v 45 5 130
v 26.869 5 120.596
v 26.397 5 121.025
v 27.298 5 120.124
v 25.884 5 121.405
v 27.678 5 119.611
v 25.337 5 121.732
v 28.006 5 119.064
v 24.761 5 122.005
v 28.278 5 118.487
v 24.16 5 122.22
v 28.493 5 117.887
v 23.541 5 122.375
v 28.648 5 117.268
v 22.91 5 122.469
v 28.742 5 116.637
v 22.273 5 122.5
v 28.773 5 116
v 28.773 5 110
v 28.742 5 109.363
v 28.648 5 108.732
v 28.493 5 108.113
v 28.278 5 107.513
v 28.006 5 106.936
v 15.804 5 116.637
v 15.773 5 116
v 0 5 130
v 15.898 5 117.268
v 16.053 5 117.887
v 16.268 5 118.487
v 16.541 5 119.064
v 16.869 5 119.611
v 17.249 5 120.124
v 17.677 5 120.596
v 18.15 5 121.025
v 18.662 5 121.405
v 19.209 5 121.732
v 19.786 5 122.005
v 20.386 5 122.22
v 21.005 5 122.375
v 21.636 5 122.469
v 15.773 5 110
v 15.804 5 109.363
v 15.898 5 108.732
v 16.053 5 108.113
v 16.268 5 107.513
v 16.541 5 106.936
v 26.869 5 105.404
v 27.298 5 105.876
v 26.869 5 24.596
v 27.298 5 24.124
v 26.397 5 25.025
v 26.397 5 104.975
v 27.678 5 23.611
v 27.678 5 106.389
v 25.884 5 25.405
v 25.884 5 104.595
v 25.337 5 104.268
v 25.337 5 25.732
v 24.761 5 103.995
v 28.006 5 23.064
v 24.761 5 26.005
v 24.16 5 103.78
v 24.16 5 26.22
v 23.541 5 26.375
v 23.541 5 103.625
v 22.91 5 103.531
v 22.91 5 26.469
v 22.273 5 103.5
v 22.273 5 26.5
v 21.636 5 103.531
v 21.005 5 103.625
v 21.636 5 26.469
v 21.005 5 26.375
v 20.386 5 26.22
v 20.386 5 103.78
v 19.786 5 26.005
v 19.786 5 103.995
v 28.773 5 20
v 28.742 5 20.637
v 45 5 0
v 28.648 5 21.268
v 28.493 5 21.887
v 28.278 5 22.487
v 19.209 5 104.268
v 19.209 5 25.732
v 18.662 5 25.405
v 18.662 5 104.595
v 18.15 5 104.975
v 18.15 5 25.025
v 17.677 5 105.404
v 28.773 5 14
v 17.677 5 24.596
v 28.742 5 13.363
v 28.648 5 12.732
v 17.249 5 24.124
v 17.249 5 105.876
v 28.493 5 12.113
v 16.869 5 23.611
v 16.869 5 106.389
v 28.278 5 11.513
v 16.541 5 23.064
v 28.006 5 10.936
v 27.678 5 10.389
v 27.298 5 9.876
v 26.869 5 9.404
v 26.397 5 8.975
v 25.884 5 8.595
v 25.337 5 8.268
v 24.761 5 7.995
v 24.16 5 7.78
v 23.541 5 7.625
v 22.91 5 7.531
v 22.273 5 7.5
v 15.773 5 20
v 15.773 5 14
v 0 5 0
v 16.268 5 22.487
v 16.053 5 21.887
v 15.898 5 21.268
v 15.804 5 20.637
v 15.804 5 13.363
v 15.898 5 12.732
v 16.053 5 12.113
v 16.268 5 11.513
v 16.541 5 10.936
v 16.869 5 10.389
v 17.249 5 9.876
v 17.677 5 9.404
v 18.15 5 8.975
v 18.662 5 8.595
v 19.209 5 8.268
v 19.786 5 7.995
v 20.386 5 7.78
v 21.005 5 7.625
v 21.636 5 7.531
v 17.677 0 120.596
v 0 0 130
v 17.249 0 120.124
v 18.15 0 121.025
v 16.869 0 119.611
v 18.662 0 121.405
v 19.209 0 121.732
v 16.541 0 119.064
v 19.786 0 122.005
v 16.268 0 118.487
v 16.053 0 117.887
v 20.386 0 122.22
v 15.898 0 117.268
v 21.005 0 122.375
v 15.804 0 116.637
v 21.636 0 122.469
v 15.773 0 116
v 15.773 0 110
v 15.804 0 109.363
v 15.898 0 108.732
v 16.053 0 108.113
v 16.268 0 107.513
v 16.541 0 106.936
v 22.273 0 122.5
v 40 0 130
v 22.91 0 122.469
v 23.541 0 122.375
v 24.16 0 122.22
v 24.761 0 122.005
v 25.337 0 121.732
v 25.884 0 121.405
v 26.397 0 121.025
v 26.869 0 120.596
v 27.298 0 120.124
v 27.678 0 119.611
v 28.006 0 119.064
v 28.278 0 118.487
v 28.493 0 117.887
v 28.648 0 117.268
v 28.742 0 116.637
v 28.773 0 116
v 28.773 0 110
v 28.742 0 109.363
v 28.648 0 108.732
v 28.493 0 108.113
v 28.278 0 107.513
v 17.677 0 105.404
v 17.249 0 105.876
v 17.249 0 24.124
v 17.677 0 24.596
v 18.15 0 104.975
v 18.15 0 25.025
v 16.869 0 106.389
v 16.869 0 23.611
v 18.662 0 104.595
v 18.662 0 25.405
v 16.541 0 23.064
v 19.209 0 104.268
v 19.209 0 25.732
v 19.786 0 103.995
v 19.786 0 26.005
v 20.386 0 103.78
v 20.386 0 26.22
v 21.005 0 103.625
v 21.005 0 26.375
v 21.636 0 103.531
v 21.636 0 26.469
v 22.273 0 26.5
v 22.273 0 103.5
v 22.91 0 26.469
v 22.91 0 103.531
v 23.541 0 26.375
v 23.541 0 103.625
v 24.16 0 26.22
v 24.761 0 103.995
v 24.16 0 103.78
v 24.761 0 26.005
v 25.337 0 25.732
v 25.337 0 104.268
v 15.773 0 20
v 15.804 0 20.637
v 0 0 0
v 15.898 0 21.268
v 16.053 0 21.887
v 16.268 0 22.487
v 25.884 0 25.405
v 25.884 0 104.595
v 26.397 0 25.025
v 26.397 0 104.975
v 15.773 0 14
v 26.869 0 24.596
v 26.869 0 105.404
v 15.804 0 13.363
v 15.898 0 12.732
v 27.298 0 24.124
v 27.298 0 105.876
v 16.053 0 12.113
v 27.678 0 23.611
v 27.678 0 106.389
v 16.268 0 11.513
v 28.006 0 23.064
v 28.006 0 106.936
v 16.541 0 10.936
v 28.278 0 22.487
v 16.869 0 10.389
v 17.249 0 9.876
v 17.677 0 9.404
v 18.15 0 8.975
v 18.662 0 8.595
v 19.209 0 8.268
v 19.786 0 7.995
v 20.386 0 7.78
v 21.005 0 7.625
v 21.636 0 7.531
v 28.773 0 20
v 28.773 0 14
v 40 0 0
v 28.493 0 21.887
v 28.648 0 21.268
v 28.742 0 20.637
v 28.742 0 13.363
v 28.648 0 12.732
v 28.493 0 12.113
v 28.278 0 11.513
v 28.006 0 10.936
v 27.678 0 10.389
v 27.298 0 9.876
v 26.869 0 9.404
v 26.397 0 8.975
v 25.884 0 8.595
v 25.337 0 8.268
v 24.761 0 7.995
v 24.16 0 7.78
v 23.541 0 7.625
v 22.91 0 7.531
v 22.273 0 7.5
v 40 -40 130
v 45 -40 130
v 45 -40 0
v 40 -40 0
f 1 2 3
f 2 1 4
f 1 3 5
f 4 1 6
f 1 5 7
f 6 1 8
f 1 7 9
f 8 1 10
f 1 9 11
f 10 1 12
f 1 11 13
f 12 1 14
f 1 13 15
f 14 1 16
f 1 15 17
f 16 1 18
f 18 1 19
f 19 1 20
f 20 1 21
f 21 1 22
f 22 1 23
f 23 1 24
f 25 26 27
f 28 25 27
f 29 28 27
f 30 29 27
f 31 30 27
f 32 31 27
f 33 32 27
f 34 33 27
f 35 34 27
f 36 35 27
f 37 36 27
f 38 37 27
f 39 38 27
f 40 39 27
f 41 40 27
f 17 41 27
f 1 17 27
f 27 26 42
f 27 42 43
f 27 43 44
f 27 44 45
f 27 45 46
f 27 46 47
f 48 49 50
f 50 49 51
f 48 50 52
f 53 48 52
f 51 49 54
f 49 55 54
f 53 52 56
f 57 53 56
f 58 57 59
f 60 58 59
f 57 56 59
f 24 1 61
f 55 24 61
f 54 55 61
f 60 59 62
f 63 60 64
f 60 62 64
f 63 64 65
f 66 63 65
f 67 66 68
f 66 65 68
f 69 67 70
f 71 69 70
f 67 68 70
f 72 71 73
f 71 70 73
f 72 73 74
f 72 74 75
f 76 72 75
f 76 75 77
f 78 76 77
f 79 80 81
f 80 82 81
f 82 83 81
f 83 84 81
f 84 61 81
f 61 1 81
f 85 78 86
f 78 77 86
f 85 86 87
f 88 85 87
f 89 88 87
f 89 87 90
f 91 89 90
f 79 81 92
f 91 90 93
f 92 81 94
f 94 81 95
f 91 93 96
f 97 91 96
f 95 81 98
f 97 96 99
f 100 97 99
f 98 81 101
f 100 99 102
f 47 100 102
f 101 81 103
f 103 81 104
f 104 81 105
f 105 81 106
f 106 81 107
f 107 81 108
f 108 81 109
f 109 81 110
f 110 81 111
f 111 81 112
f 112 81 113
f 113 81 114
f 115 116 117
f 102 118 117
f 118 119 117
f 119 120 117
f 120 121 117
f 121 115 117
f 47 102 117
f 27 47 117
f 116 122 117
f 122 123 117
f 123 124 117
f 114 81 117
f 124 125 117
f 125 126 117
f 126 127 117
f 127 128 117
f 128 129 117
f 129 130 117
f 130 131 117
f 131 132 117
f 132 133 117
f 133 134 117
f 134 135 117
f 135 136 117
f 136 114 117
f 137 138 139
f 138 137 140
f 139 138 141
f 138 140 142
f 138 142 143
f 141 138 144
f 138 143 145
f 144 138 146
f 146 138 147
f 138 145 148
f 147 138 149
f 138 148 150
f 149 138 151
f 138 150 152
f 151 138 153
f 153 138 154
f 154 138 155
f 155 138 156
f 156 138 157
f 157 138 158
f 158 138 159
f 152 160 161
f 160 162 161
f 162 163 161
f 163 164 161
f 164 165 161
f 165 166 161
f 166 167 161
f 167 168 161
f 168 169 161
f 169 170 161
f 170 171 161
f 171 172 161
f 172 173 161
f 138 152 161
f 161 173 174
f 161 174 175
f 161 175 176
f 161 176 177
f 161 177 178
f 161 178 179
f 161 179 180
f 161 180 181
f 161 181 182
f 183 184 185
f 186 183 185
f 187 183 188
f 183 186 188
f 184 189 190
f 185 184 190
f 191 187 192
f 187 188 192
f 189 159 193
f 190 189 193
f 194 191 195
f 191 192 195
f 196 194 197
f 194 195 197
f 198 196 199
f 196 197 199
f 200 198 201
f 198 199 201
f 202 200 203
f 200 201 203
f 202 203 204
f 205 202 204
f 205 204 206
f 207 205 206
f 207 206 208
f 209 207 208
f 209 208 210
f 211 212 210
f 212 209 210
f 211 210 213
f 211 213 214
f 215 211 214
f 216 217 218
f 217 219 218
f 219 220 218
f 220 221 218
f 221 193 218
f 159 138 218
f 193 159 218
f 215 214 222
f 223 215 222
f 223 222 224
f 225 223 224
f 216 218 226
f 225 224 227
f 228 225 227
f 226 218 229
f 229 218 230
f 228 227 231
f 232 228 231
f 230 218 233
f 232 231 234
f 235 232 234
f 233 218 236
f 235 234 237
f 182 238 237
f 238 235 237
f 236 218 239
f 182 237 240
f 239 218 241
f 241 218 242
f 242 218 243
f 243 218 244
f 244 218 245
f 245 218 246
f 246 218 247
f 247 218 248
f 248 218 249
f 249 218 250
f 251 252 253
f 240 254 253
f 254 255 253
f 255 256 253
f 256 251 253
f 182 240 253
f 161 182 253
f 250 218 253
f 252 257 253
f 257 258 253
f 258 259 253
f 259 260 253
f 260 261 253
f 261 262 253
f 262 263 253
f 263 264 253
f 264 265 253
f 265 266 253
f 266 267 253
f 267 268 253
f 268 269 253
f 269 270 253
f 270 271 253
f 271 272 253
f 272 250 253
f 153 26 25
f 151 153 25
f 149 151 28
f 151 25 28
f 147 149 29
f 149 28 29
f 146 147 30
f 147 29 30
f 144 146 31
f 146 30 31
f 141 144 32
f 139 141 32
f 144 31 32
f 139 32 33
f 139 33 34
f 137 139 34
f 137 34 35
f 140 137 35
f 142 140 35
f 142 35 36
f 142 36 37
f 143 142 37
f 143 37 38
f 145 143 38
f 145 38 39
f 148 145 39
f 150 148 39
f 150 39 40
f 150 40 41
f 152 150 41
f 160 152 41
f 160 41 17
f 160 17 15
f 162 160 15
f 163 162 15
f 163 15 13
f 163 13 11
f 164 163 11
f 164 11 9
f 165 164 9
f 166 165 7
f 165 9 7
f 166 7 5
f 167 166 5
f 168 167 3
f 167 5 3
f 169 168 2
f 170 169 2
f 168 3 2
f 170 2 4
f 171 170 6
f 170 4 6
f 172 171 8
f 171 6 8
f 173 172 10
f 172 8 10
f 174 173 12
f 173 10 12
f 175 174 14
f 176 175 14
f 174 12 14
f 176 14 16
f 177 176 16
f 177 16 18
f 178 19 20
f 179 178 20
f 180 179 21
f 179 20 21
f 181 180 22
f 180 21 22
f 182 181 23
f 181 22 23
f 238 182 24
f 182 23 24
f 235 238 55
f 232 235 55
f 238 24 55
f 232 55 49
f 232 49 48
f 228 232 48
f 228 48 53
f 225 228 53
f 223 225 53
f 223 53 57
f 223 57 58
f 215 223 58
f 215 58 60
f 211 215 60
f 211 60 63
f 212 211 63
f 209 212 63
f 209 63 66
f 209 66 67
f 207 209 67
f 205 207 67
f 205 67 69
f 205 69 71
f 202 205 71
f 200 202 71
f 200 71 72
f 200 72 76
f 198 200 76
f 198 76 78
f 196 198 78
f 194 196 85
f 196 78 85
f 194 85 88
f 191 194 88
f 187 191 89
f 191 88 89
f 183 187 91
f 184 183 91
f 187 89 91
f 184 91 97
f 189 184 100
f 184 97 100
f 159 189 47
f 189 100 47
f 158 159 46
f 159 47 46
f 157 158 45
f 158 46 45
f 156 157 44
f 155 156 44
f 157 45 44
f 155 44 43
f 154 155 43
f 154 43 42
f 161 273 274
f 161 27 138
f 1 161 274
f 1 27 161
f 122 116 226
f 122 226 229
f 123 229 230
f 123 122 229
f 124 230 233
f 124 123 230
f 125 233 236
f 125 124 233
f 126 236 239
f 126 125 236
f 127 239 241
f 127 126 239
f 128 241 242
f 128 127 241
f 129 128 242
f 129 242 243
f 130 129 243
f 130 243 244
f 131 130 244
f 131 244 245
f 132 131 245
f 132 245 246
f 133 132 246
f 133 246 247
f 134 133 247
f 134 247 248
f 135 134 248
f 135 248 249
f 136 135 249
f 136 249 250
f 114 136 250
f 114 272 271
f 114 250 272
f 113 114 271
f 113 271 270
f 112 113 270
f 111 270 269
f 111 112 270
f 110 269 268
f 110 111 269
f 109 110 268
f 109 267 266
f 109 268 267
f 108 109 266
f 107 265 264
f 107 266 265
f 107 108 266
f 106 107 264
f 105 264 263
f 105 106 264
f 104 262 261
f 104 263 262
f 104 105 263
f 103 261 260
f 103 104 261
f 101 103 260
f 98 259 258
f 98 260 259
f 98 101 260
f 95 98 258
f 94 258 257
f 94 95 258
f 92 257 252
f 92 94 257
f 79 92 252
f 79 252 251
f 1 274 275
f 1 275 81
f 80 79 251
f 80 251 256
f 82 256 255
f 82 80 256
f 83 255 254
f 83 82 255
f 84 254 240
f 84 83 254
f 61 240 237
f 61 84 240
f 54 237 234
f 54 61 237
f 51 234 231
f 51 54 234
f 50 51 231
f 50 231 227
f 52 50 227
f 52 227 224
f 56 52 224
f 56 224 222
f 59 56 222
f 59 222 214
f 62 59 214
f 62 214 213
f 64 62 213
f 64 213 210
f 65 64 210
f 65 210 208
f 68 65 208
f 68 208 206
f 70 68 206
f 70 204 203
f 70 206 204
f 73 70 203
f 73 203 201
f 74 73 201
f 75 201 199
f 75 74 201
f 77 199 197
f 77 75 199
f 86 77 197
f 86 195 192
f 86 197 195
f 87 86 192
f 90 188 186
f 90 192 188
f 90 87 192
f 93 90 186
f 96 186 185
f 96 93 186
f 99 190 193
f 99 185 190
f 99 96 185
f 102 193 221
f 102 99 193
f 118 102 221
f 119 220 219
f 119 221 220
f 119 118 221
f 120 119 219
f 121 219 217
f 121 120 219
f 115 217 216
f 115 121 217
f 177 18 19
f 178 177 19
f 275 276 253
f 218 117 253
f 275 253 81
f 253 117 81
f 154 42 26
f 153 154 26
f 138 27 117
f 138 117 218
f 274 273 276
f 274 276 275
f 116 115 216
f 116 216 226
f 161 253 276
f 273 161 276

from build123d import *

# Parameters (mm, degrees)
BOSS_EXTRUDE1_DEPTH = 130
CUT_EXTRUDE1_DEPTH  = 10


with BuildPart() as part:
    # Sketch2 → Boss-Extrude1 (new body)
    with BuildSketch(Plane.XY):
        Polygon((0, 0), (40, 0), (40, -40), (45, -40), (45, 5), (0, 5), align=None)
    extrude(amount=BOSS_EXTRUDE1_DEPTH)

    # Sketch3 → Cut-Extrude1 (cut)
    with BuildSketch(Plane(origin=(0, 5, 0), x_dir=(1, 0, 0), z_dir=(0, 1, 0))):
        with BuildLine():
            Line((28.773082799, -14), (28.773082799, -20))
            ThreePointArc((28.773082799, -20), (22.273082799, -26.5), (15.773082799, -20))
            Line((15.773082799, -20), (15.773082799, -14))
            ThreePointArc((15.773082799, -14), (22.273082799, -7.5), (28.773082799, -14))
        make_face()
        with BuildLine():
            Line((28.773082799, -116), (28.773082799, -110))
            ThreePointArc((28.773082799, -110), (22.273082799, -103.5), (15.773082799, -110))
            Line((15.773082799, -110), (15.773082799, -116))
            ThreePointArc((15.773082799, -116), (22.273082799, -122.5), (28.773082799, -116))
        make_face()
    extrude(amount=-CUT_EXTRUDE1_DEPTH, mode=Mode.SUBTRACT)


solid = part.part
